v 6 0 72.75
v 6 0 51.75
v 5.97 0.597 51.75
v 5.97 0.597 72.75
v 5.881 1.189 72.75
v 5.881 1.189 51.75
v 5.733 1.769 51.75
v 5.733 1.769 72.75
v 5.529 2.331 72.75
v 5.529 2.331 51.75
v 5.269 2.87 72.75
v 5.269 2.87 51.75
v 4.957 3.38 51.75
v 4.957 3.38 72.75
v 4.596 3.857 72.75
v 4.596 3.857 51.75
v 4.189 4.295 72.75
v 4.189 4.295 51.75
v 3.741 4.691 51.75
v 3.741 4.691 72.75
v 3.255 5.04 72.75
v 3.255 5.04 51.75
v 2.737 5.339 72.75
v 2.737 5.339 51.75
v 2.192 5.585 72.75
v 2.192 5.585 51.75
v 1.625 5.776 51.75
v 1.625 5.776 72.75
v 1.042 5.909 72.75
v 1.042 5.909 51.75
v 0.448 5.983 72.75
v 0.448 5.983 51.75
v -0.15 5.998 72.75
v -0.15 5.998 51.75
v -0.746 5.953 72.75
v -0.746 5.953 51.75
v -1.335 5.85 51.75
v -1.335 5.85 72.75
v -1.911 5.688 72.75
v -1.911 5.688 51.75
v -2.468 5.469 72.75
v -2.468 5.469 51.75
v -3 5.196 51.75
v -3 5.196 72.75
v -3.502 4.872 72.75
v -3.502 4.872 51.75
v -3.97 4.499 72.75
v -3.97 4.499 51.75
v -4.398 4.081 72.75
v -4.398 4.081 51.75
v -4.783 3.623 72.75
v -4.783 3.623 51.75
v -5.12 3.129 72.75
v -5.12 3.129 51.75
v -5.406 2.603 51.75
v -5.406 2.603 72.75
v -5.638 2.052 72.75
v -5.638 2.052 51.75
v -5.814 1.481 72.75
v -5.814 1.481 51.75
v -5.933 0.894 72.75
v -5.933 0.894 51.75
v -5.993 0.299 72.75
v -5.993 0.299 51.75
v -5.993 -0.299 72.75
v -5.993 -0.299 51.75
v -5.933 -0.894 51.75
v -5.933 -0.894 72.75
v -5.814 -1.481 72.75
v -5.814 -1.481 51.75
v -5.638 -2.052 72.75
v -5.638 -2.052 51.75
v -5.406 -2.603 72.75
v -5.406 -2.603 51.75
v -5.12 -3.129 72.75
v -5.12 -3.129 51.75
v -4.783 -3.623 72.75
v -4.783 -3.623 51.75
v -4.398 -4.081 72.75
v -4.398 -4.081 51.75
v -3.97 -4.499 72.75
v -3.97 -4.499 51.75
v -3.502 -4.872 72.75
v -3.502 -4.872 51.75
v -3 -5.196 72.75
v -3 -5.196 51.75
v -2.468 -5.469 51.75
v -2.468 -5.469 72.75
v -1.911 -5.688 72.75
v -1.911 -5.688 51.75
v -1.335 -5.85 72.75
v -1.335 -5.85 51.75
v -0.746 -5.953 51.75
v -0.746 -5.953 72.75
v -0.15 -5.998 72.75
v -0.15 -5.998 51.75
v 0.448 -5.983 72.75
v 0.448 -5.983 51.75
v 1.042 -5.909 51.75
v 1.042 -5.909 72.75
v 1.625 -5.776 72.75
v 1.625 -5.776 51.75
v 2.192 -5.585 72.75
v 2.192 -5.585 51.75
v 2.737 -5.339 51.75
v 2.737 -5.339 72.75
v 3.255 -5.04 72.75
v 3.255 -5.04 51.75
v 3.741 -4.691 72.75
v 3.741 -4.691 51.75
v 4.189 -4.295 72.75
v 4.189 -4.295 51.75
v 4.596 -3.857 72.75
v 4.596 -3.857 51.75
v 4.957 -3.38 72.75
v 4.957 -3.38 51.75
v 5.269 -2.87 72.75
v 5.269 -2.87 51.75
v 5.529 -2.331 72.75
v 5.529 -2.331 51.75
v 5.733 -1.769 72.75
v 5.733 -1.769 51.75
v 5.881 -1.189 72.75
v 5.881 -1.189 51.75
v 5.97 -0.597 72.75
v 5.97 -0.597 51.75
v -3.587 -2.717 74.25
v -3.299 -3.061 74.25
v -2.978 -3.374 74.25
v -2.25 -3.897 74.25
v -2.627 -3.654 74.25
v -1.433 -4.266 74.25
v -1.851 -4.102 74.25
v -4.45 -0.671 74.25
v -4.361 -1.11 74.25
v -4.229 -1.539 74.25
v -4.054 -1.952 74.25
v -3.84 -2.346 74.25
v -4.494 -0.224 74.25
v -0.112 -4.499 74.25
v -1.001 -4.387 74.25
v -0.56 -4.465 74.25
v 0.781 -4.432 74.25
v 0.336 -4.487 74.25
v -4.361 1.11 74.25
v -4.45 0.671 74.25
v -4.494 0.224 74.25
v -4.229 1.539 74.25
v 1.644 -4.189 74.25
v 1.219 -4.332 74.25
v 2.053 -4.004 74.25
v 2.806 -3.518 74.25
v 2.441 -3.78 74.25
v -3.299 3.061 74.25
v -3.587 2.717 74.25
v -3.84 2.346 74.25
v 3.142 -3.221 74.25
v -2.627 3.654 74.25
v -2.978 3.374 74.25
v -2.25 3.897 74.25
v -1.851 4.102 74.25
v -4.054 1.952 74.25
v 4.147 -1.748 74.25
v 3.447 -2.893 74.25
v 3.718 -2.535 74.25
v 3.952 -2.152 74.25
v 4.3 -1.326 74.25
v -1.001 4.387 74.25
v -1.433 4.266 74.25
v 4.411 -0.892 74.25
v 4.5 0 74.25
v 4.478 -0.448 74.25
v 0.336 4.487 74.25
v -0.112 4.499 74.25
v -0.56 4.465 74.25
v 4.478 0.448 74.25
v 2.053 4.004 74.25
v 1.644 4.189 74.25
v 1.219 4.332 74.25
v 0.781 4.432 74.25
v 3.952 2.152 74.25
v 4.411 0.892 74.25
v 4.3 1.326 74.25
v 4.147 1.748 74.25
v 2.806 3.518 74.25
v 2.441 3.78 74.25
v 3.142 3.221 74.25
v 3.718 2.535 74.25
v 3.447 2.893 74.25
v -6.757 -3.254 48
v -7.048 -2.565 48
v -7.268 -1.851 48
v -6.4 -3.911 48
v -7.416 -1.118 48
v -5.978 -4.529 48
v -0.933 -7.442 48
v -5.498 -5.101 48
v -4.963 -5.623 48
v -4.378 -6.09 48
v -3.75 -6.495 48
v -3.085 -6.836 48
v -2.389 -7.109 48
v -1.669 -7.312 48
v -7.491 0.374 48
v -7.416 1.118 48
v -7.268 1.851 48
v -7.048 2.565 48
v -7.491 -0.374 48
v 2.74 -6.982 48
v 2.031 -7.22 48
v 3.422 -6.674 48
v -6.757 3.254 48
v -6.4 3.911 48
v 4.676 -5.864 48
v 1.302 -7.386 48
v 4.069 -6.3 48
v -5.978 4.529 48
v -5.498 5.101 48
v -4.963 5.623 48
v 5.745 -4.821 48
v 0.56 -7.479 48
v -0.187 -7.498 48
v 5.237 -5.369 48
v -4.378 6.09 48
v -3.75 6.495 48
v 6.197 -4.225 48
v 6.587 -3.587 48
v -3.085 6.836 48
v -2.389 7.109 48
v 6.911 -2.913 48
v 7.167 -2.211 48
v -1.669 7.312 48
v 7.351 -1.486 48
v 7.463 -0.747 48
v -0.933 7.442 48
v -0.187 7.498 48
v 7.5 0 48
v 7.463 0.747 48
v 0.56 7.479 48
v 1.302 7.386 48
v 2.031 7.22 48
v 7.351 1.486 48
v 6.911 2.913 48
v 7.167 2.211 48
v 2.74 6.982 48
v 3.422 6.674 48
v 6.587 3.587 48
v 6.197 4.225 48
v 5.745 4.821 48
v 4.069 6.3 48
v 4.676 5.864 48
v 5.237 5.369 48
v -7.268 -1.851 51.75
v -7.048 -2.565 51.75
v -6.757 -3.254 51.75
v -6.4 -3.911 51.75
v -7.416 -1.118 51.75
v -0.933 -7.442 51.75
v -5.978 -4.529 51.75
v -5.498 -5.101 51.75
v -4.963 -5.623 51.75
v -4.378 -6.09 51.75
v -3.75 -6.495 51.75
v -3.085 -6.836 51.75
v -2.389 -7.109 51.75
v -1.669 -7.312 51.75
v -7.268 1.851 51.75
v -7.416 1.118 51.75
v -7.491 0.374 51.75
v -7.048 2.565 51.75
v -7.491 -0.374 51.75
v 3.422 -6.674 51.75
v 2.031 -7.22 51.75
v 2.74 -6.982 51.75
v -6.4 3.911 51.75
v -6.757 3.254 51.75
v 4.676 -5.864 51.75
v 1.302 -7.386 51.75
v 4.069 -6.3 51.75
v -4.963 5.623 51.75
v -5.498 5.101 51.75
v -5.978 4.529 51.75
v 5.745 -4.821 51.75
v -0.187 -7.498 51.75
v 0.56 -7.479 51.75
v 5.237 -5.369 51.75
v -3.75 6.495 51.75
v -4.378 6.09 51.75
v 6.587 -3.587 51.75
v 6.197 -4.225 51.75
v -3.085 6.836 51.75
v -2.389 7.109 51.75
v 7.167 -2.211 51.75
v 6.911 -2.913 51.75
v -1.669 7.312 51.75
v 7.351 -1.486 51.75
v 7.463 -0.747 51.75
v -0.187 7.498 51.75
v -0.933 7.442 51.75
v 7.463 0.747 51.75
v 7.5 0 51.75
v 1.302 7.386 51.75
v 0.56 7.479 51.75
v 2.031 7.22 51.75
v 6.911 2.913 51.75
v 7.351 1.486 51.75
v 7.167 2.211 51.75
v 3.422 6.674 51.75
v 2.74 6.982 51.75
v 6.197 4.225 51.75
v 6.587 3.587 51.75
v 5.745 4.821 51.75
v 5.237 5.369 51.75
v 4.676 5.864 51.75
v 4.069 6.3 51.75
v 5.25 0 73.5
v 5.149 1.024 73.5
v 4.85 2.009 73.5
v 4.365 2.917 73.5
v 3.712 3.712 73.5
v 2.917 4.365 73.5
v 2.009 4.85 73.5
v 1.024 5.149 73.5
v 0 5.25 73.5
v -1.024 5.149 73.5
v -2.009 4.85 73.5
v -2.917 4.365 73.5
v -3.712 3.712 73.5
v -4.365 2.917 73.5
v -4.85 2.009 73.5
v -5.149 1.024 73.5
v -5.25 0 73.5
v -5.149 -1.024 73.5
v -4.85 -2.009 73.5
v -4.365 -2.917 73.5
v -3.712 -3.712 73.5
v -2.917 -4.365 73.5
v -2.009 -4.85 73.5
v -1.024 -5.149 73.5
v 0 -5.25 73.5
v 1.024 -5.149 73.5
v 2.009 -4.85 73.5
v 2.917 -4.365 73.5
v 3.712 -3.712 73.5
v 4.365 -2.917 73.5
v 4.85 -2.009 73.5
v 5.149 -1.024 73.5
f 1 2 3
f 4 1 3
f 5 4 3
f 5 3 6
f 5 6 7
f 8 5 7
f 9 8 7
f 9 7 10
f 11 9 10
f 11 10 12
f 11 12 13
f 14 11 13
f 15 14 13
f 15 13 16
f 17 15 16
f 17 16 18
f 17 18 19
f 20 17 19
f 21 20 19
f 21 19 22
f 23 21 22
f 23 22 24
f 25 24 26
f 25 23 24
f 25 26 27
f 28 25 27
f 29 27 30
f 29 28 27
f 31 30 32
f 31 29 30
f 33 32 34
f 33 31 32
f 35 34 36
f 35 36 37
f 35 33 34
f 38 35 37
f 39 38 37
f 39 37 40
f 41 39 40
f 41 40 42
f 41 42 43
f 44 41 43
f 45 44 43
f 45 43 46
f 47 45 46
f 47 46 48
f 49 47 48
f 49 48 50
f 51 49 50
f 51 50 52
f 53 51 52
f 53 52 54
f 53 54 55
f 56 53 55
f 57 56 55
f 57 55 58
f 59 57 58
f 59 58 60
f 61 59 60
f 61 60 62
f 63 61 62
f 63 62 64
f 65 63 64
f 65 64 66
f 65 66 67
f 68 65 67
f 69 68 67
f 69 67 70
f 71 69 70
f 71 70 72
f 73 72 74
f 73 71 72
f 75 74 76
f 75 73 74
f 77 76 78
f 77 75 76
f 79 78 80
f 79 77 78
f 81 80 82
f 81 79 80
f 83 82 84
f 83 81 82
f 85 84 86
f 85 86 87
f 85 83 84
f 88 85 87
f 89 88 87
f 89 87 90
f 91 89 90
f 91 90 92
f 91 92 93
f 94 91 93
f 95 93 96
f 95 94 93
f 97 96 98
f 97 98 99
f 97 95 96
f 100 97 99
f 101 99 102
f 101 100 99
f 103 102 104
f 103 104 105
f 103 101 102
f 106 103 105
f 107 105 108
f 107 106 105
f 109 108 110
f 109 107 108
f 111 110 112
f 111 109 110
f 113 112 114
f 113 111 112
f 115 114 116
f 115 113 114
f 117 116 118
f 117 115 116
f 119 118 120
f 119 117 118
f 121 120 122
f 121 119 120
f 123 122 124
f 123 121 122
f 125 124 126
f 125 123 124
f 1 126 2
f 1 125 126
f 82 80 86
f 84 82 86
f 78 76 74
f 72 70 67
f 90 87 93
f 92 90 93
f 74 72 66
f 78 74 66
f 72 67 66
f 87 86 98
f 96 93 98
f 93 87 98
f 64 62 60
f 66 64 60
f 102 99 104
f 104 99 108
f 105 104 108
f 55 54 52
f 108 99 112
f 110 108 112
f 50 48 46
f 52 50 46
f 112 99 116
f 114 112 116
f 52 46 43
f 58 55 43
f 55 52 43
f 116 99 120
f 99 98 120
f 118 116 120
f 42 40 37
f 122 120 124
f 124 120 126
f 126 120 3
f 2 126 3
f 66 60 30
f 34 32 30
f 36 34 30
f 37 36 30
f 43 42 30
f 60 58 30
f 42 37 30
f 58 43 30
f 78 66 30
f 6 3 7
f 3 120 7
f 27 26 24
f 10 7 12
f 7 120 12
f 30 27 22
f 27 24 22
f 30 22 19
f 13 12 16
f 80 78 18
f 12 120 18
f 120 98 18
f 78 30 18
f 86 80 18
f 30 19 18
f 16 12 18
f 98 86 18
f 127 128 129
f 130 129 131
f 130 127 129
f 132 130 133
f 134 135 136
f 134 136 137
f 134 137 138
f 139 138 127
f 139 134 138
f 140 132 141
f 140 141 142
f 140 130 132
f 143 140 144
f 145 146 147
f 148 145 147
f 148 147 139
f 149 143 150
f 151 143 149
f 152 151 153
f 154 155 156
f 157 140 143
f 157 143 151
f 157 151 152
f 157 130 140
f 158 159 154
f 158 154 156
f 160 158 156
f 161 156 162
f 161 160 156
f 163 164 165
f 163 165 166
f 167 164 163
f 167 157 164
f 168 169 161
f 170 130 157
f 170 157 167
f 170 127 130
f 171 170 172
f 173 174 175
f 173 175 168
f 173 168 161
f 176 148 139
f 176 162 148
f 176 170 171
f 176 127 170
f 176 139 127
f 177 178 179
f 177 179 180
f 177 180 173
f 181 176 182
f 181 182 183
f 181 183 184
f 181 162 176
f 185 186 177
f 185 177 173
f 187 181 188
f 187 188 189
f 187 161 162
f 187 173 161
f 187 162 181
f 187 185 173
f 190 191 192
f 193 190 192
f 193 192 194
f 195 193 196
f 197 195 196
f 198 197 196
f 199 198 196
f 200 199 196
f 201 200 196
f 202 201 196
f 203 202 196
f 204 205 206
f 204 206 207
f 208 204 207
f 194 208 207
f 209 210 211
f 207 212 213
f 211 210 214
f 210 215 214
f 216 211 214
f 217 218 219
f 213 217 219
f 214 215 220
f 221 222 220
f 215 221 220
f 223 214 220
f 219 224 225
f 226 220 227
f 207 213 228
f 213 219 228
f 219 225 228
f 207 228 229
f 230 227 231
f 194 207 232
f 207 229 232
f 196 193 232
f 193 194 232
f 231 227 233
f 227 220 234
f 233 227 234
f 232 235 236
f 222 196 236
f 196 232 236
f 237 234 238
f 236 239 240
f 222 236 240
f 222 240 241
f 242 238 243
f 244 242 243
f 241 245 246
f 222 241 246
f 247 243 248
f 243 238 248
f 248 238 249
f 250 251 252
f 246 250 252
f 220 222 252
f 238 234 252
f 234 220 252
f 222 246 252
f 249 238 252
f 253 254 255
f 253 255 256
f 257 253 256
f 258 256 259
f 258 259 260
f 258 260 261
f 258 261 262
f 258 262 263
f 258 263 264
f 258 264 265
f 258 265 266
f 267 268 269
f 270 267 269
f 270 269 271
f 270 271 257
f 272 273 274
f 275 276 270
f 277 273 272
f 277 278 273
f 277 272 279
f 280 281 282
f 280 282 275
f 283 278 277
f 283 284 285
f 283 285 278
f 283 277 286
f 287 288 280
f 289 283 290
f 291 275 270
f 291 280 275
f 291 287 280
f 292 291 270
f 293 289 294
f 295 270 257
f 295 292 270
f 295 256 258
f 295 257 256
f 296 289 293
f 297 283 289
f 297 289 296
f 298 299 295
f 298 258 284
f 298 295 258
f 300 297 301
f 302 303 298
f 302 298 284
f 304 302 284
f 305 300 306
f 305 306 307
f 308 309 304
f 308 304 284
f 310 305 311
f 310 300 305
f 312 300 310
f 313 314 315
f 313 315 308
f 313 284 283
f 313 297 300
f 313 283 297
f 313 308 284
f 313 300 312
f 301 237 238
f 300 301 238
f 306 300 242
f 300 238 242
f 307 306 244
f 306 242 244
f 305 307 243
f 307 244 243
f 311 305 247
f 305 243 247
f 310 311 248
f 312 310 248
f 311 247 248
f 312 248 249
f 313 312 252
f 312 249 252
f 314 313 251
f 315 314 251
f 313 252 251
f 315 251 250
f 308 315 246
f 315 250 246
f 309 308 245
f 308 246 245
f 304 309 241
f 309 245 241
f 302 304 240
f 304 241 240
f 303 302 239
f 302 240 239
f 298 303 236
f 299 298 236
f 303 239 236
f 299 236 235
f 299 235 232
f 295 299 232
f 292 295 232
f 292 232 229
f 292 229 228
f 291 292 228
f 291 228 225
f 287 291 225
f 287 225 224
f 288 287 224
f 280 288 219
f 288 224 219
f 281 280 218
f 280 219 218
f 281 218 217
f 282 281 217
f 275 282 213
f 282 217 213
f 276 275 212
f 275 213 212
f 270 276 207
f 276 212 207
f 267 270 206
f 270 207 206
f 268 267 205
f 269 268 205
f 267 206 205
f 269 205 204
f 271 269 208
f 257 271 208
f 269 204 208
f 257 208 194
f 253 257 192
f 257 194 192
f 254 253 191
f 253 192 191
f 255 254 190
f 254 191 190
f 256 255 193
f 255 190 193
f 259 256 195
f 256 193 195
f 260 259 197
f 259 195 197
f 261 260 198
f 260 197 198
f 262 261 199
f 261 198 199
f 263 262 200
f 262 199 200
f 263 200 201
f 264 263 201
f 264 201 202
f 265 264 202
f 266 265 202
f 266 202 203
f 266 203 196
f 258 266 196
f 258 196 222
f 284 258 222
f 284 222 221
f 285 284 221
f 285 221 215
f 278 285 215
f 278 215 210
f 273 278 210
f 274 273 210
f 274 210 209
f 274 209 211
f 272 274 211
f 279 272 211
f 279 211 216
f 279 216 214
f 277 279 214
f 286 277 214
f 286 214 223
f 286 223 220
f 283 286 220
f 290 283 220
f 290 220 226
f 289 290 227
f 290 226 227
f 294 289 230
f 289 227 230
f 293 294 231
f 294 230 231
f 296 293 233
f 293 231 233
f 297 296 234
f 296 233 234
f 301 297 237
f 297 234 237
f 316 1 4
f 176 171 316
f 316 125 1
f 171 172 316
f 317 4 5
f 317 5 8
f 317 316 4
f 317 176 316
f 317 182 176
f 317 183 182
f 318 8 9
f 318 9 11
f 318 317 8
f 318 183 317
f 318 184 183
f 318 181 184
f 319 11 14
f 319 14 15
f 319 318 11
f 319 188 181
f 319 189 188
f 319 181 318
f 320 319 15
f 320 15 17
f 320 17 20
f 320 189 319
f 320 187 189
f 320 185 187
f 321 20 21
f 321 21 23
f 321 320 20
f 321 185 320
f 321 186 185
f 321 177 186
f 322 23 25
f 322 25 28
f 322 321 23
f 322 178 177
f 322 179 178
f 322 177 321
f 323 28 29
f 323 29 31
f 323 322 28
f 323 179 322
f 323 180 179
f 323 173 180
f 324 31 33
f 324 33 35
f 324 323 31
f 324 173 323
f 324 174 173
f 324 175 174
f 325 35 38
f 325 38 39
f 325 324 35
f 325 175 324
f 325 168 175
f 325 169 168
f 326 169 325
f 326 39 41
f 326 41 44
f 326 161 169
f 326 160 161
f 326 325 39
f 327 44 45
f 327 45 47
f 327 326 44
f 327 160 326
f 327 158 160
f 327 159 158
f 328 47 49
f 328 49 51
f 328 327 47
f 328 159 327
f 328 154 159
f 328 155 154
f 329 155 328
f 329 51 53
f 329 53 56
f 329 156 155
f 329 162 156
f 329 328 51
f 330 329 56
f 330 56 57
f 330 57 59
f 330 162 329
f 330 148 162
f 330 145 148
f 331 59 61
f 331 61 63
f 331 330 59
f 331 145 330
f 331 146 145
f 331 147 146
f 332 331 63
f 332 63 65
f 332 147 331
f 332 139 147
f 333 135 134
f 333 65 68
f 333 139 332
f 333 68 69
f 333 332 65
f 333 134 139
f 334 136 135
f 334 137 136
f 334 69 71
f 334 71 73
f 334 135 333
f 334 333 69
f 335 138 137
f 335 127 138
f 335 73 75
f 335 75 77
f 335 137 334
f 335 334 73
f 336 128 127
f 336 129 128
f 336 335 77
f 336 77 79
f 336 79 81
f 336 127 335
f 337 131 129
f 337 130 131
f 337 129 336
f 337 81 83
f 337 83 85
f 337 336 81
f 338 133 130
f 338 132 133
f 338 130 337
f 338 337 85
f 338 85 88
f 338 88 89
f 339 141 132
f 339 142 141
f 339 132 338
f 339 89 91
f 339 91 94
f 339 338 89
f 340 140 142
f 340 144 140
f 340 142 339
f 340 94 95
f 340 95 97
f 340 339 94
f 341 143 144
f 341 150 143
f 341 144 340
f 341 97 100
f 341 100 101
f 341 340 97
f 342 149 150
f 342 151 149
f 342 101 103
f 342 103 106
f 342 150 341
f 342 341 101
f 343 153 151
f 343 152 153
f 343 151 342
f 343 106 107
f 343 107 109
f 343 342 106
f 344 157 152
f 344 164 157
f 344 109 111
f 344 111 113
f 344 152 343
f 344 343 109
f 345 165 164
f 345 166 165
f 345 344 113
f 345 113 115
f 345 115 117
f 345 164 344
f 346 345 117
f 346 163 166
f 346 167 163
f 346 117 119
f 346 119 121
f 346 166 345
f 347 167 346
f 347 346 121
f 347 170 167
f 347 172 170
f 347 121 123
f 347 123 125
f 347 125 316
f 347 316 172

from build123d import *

# Parameters (mm, degrees)
F2_R      = 6
F4_R      = 7.5
F4_R_2    = 6
F10_DEPTH = 3.75
F11_SIZE  = 1.5


with BuildPart() as f9:
    # F9: sweep along a path in F0
    with BuildLine(Plane.XZ) as f9_path:
        Line((-6, 51.75), (-6, 74.25))
    # F2 (on line) → F9 (sweep)
    with BuildSketch(Plane.XY.offset(74.25)):
        Circle(F2_R)
    sweep(path=f9_path.line)

    # F11
    f11_edges = [f9.edges().sort_by_distance(p)[0] for p in [
        (-6, 0, 74.25),
    ]]
    chamfer(f11_edges, length=F11_SIZE)


with BuildPart() as f10:
    # F4 (on line) → F10 (new body)
    with BuildSketch(Plane.XY.offset(48)):
        Circle(F4_R)
        Circle(F4_R_2, mode=Mode.SUBTRACT)
        Circle(F4_R_2)
    extrude(amount=F10_DEPTH)


solid = Compound([f9.part, f10.part])
